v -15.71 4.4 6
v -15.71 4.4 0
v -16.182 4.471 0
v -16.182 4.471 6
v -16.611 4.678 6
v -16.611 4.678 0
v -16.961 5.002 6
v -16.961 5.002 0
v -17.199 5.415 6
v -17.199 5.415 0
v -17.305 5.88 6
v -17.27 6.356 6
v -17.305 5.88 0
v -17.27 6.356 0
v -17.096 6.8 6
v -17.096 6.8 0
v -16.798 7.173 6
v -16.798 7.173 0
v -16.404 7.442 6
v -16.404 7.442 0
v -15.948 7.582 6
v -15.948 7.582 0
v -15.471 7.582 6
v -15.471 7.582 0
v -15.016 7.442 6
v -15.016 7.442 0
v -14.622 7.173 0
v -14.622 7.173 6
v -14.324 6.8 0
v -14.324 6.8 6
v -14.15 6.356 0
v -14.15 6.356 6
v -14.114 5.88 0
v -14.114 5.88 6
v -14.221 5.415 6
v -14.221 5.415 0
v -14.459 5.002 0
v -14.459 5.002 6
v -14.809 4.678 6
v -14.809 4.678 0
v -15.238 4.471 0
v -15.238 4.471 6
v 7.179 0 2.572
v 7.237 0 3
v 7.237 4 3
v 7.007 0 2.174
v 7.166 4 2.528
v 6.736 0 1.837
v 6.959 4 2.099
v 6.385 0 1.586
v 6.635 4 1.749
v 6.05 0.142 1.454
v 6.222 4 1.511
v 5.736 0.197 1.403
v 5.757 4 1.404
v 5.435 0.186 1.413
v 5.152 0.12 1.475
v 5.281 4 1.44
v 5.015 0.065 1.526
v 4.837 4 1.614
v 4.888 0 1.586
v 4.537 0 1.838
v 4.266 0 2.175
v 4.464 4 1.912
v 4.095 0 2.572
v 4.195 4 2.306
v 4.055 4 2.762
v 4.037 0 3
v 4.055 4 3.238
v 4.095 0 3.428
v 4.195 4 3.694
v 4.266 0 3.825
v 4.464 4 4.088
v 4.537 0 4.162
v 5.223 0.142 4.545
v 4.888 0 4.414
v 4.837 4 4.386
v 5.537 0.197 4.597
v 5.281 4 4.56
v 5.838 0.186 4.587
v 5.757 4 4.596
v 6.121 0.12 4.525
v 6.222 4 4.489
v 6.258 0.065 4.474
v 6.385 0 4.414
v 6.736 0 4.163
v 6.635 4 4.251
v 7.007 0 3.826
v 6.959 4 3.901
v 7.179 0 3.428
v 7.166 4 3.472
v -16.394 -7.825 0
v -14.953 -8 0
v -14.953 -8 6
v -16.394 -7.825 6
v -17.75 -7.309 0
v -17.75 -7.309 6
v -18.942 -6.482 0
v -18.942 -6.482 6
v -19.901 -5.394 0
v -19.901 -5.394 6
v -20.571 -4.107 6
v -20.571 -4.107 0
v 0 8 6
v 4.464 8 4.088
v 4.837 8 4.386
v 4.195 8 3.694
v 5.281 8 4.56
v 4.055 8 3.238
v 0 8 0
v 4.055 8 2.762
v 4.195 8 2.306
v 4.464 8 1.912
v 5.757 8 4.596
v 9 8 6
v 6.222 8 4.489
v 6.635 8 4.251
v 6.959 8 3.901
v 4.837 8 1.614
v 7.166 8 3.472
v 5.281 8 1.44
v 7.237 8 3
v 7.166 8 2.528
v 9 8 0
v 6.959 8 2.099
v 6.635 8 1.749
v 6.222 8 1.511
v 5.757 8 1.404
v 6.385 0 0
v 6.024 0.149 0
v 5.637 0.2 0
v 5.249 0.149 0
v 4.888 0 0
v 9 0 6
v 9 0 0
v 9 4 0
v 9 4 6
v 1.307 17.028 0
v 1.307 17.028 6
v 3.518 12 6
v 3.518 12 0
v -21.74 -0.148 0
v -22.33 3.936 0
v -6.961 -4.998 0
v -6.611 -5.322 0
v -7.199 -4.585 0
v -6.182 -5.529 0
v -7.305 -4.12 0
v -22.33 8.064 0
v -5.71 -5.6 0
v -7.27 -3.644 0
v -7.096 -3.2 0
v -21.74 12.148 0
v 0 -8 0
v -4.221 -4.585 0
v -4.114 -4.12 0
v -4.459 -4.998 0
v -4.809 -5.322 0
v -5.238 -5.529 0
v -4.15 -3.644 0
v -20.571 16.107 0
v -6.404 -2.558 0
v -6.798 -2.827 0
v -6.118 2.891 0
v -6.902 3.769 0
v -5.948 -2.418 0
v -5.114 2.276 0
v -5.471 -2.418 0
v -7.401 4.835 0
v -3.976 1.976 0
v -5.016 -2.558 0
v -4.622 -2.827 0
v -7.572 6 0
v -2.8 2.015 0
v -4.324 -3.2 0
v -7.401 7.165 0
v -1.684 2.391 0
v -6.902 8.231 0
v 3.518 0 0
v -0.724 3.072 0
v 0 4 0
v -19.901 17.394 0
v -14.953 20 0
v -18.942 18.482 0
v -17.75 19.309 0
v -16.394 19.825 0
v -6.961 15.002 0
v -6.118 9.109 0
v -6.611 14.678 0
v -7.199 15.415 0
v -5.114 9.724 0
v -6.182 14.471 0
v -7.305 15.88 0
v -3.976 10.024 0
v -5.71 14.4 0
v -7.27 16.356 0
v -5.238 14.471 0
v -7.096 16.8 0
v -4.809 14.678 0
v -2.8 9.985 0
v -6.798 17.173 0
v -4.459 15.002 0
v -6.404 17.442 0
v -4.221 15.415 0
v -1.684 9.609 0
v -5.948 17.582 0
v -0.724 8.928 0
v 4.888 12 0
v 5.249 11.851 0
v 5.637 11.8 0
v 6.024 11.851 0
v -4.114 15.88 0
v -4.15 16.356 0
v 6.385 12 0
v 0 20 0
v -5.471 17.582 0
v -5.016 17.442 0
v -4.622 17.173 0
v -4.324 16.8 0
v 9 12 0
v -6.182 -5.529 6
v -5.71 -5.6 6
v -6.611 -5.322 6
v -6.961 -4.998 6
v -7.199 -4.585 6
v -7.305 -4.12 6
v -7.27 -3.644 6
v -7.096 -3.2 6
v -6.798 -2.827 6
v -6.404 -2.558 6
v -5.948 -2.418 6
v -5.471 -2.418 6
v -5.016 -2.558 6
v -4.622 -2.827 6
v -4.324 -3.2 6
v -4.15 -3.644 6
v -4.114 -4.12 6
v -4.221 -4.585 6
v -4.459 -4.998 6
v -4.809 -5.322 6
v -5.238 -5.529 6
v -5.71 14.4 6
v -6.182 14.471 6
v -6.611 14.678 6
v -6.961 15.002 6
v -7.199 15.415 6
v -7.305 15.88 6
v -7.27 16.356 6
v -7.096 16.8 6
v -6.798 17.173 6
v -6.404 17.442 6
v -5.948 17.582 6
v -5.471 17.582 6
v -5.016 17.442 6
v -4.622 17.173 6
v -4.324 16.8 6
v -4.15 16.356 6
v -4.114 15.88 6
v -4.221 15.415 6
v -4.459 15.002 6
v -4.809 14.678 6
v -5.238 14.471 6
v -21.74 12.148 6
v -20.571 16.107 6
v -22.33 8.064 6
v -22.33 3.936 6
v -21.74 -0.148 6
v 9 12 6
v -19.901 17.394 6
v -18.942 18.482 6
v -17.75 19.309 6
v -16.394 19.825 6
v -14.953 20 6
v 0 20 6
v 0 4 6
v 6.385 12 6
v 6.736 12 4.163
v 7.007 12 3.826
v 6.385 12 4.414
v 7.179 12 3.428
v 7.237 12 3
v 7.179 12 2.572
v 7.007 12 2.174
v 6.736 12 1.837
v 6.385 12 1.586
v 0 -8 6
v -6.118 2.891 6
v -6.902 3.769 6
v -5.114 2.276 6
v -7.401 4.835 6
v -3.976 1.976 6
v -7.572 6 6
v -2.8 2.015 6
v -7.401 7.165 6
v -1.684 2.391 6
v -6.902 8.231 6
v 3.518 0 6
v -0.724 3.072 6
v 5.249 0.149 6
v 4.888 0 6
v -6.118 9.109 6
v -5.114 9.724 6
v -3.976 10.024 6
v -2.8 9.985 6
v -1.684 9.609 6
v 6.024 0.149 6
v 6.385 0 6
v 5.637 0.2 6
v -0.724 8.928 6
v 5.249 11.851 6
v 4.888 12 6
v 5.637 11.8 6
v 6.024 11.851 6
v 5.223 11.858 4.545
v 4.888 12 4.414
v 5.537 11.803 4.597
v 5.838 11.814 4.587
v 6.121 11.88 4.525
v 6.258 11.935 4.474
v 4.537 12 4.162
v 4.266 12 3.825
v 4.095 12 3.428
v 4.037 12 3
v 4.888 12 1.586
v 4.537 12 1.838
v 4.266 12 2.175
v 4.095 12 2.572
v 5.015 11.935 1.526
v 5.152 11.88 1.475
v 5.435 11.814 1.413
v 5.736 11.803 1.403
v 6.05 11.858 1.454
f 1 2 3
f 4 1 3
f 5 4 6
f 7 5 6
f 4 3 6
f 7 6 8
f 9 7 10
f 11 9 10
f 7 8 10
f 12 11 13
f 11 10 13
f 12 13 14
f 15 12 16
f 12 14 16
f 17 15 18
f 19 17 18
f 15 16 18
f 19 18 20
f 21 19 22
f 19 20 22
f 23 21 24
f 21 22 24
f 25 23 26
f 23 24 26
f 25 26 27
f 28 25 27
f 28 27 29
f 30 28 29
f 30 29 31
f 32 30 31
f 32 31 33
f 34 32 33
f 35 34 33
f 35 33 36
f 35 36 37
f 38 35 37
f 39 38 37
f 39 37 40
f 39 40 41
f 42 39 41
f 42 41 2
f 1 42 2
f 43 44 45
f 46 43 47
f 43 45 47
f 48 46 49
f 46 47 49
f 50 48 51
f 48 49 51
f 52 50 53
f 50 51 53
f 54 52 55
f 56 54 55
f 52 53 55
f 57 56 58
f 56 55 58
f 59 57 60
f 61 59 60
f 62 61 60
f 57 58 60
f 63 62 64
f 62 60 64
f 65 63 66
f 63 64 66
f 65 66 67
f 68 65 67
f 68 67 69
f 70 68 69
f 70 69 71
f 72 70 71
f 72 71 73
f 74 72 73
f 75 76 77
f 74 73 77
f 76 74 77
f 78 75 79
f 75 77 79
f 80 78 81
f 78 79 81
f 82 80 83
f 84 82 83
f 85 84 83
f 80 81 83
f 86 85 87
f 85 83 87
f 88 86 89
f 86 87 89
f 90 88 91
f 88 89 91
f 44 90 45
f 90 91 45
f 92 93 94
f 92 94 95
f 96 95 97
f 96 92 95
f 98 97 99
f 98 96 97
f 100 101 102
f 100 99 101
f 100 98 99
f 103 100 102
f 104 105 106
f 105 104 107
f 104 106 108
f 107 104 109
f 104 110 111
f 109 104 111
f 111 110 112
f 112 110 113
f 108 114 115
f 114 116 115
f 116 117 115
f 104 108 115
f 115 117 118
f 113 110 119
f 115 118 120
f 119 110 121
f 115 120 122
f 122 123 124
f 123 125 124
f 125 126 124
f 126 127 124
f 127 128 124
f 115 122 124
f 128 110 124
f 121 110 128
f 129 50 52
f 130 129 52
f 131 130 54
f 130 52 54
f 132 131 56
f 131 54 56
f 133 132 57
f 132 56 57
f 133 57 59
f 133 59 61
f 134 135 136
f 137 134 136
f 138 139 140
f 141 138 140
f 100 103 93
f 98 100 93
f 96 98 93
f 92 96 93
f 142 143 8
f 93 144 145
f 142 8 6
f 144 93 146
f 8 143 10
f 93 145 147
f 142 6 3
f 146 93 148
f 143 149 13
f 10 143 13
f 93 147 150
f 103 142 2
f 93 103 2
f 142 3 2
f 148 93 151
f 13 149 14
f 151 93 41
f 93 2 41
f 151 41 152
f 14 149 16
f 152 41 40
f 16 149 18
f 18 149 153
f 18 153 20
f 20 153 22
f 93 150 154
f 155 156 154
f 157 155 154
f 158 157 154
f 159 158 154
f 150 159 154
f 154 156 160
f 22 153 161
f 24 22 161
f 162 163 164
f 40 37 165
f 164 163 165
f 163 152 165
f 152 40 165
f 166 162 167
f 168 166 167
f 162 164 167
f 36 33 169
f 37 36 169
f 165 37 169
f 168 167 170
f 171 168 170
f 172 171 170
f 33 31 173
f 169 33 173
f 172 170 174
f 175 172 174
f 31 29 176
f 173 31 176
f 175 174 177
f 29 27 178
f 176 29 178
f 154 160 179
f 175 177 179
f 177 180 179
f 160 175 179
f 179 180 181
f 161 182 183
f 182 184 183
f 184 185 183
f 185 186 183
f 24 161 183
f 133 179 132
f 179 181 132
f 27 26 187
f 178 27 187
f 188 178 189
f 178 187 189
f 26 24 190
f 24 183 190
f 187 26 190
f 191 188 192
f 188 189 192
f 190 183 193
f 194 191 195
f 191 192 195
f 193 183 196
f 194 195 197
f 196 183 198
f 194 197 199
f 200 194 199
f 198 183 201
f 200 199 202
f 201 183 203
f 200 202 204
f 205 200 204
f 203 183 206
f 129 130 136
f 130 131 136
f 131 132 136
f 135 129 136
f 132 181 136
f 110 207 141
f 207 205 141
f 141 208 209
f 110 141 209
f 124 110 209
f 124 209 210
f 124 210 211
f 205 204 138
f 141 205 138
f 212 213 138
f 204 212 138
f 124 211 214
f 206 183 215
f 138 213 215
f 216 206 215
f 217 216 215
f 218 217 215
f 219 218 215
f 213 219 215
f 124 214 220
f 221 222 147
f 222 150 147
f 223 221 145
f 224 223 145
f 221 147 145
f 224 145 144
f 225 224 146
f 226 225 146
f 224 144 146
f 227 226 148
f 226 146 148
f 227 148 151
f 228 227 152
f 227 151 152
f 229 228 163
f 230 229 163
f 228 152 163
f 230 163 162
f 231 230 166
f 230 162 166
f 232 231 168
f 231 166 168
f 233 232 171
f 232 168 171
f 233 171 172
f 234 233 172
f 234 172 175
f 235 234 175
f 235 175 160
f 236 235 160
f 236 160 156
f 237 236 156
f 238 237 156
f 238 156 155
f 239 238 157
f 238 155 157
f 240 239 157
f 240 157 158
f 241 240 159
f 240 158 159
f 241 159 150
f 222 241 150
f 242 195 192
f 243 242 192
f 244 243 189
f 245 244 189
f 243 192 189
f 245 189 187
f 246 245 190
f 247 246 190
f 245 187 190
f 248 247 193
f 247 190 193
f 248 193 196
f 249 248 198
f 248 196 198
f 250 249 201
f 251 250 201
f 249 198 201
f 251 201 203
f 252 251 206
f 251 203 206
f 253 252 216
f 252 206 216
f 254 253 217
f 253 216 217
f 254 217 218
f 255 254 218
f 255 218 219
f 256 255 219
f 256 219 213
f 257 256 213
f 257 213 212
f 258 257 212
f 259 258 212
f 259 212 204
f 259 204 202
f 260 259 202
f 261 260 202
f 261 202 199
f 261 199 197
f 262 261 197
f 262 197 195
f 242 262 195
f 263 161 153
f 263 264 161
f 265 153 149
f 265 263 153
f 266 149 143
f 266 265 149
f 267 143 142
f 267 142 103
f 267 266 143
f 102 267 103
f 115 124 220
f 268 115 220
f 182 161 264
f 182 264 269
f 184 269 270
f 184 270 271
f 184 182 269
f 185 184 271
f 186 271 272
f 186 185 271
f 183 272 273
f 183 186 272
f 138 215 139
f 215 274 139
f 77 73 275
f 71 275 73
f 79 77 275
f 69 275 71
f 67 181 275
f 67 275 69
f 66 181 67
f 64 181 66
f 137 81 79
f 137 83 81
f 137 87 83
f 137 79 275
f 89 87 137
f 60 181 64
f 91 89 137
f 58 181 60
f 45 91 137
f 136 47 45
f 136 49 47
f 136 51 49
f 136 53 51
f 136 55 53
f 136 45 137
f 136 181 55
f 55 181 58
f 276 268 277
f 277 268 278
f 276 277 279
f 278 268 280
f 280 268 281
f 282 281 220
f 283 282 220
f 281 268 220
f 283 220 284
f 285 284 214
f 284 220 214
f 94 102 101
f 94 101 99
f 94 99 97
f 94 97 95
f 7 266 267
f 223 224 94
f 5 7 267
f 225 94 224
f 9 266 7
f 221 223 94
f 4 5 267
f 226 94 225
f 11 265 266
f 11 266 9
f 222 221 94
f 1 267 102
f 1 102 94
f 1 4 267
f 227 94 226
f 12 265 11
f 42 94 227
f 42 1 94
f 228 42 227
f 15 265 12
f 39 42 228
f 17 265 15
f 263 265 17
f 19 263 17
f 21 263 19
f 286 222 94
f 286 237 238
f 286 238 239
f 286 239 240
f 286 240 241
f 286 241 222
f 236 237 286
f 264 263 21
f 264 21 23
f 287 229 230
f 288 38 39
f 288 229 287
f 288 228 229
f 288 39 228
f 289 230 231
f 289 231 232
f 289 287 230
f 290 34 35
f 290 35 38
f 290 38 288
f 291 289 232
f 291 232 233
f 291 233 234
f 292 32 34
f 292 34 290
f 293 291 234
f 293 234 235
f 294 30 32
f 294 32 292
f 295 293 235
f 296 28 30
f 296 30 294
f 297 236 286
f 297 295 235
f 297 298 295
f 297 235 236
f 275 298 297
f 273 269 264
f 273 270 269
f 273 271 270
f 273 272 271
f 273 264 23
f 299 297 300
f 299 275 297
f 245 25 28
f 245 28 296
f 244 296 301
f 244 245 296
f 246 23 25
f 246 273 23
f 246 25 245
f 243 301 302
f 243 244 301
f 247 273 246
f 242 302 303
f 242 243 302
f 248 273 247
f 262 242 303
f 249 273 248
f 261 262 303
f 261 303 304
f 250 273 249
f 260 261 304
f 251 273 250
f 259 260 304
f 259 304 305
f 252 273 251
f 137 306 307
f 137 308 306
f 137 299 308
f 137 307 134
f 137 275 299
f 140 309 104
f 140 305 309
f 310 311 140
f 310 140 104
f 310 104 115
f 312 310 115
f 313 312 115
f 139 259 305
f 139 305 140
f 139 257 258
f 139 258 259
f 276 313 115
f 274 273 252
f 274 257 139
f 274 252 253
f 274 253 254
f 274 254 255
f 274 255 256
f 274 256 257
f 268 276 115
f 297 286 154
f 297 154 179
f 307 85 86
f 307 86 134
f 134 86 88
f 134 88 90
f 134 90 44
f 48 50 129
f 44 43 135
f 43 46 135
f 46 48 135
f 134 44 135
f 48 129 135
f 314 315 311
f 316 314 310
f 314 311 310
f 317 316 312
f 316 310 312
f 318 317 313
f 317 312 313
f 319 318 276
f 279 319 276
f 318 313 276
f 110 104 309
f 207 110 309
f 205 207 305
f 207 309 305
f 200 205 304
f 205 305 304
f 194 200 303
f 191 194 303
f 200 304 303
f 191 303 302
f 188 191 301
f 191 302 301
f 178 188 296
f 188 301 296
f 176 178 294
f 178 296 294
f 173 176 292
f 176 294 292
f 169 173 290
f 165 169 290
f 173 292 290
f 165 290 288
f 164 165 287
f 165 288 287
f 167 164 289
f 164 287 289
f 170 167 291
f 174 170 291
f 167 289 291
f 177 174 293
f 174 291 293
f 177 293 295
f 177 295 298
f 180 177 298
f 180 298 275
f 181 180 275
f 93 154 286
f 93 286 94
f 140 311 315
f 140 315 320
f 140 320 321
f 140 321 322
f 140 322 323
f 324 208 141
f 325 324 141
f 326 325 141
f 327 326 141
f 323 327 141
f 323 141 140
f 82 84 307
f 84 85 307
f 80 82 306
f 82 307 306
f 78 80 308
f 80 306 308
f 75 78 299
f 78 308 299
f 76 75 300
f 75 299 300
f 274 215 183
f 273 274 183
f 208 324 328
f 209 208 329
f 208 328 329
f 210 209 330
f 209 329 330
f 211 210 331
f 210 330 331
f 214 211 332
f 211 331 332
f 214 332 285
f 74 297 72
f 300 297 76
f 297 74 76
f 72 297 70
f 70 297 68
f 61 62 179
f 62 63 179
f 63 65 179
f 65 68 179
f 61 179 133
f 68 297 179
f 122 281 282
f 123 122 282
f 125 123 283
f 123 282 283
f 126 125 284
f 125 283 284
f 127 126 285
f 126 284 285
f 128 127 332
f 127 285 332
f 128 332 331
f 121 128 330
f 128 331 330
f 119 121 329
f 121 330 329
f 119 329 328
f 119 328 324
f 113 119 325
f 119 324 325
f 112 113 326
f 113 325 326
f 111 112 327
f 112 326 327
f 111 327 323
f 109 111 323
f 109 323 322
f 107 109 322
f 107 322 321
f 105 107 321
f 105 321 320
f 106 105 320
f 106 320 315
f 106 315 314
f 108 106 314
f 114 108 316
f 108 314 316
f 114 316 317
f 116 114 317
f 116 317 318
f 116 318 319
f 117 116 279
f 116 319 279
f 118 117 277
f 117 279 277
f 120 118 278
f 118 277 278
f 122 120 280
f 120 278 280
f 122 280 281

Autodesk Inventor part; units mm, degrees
ref_plane "YZ Plane" through (0, 0, 0) normal (1, 0, 0) x (0, 1, 0)
ref_plane "XZ Plane" through (0, 0, 0) normal (0, 1, 0) x (-1, 0, 0)
ref_plane "XY Plane" through (0, 0, 0) normal (0, 0, 1) x (1, 0, 0)
sketch "スケッチ1" plane through (0, 0, 0) normal (0, 0, 1) x (1, 0, 0)
  line L0 (9, 0) -> (9, 4)
  line L1 (9, 12) -> (2.2731, 12)
  line L2 (0, 8) -> (9, 8)
  line L3 (0, 4) -> (9, 4)
  line L4 (9, 8) -> (9, 12)
  arc A0 (0, 8) -> (0, 4) centre (-5.7099, 6) ccw
  line L5 (2.2731, 12) -> (0, 14.2779)
  line L6 (2.2731, 0) -> (-5.7099, -8)
  line L7 (-5.7099, 20) -> (-15.7099, 20)
  line L8 (-5.7099, -8) -> (-15.7099, -8)
  line L9 (-15.7099, 20) -> (-25.7698, 20)
  line L10 (-25.7698, 20) -> (-25.7698, -8)
  line L11 (-25.7698, -8) -> (-15.7099, -8)
  line L12 (2.2731, 0) -> (9, 0)
  line L13 (0, 14.2779) -> (-5.7099, 20)
  point P0 (0, 0)
  point P1 (4.5, 12)
  point P2 (4.5, 0)
  point P3 (4.5, 4)
  point P4 (-25.7099, 6)
  dimension "d4" = 12.1
  dimension "d5" = 4
  dimension "d6" = 14
  dimension "d7" = 14
  dimension "d8" = 10
  dimension "d9" = 10
  dimension "d10" = 20
  dimension "d12" = 14
extrude "押し出し1" add sketch "スケッチ1" along normal blind 6
sketch "スケッチ2" plane through (0, 0, 6) normal (0, 0, 1) x (1, 0, 0)
  circle A0 centre (5.6365, 13.3) radius 1.5
  line L0 (9, 8) -> (9, 12) projected
  line L1 (11.5477, 6) -> (-28.1936, 6) construction
  line L2 (9, 12) -> (2.2731, 12) projected
  circle A1 centre (5.6365, -1.3) radius 1.5
  point P0 (0, 0)
  point P1 (4.8882, 12)
  point P2 (6.3849, 12)
  dimension "d15" = 3
  dimension "d16" = 3.3635
  dimension "d17" = 1.3
extrude "押し出し2" cut sketch "スケッチ2" against normal blind 6 contours A0 L2 | A1 picked at (5.4614, 13.0013)
sketch "スケッチ3" plane through (0, 0, 6) normal (0, 0, 1) x (1, 0, 0)
  circle A0 centre (5.6365, 13.3) radius 1.5
  line L0 (9, 12) -> (2.2731, 12) projected
  point P0 (0, 0)
  point P1 (4.8882, 12)
  point P2 (6.3849, 12)
  dimension "d20" = 3
  dimension "d21" = 1.3
extrude "押し出し3" add sketch "スケッチ3" against normal blind 6 contours A0 L0 picked at (5.4614, 13.0013)
sketch "スケッチ4" plane through (0, 0, 6) normal (0, 0, 1) x (1, 0, 0)
  arc A0 (6.3849, 12) -> (4.8882, 12) centre (5.6365, 13.3) ccw projected
  circle A1 centre (5.6365, 13.3) radius 1.5
  point P0 (0, 0)
  dimension "d24" = 3
extrude "押し出し4" cut sketch "スケッチ4" against normal blind 6
fillet "フィレット1" radius 5 1 edges at (-25.7698, 20, 3)
fillet "フィレット2" radius 5 1 edges at (-25.7698, -8, 3)
fillet "フィレット3" radius 3 4 edges at (-5.7099, -8, 3) (2.2731, 0, 3) (-5.7099, 20, 3) (2.2731, 12, 3)
sketch "スケッチ6" plane through (0, 4, 0) normal (0, 1, 0) x (1, 0, 0)
  point P0 (0, 0)
sketch "スケッチ7" plane through (4.8882, 12, 6) normal (0, 1, 0) x (1, 0, 0)
  circle A0 centre (0.7488, 3) radius 1.6
  line L0 (1.4967, 0) -> (0, 0) projected
  line L1 (4.1118, 6) -> (4.1118, 0) projected
  point P0 (-4.8882, 6)
  point P1 (0.7483, 0)
  dimension "d43" = 3.2
  dimension "d44" = 3
  dimension "d45" = 3.363
extrude "押し出し5" cut sketch "スケッチ7" against normal blind 28
sketch "スケッチ11" plane through (0, 0, 6) normal (0, 0, 1) x (1, 0, 0)
  line L0 (-6.9544, 20) -> (-20.7698, 20) projected
  line L1 (-20.7698, 20) -> (-6.9544, 20)
  arc A0 (1.394, 12.8809) -> (3.5176, 12) centre (3.5176, 15) ccw projected
  line L2 (0, 20) -> (1.3068, 17.0279)
  arc A1 (1.394, 12.8809) -> (3.5176, 12) centre (3.5176, 15) ccw
  arc A2 (-4.8308, 19.1191) -> (-6.9544, 20) centre (-6.9544, 17) ccw projected
  arc A3 (-4.8308, 19.1191) -> (-6.9544, 20) centre (-6.9544, 17) ccw
  line L3 (1.394, 12.8809) -> (-4.8308, 19.1191) projected
  line L4 (-4.8308, 19.1191) -> (1.394, 12.8809)
  arc A4 (0, 8) -> (0, 4) centre (-5.7099, 6) ccw projected
  line L5 (-11.7599, 6) -> (12.1155, 6) construction
  line L6 (-20.7698, -8) -> (0, -8)
  line L7 (0, -8) -> (3.5176, 0)
  arc A5 (-6.9544, -8) -> (-4.8308, -7.1191) centre (-6.9544, -5) ccw
  line L8 (1.394, -0.8809) -> (-4.8308, -7.1191)
  line L9 (-6.9544, 20) -> (0, 20)
  line L10 (1.3068, 17.0279) -> (3.5176, 12)
  arc A6 (3.5176, 0) -> (1.394, -0.8809) centre (3.5176, -3) ccw
  point P0 (0, 0)
extrude "押し出し6" add sketch "スケッチ11" against normal blind 6
sketch "スケッチ12" plane through (0, 0, 6) normal (0, 0, 1) x (1, 0, 0)
  arc A0 (0, 8) -> (0, 4) centre (-5.7099, 6) ccw projected
  point P0 (0, 0)
  point P1 (-15.7099, 6)
  point P2 (-5.7099, 16)
  point P3 (-5.7099, -4)
  dimension "d74" = 10
  dimension "d76" = 10
  dimension "d77" = 10
hole "穴4" at (-15.7099, 6, 6) at (-5.7099, 16, 6) at (-5.7099, -4, 6) direction (0, 0, -1) diameter 3.2 end through all
sketch "スケッチ13" plane through (0, 0, 6) normal (0, 0, 1) x (1, 0, 0)
  line L0 (-20.7698, -8) -> (0, -8) projected
  line L1 (0, 20) -> (-20.7698, 20) projected
  line L2 (-18.7698, 20) -> (-18.7698, -8) construction
  line L3 (-25.7698, 15) -> (-25.7698, -3) projected
  arc A0 (-18.7698, 20) -> (-18.7698, -8) centre (6.3784, 6) ccw
  line L4 (-18.7698, 20) -> (-29.3351, 20)
  line L5 (-29.3351, 20) -> (-29.3351, -8)
  line L6 (-29.3351, -8) -> (-18.7698, -8)
  point P0 (0, 0)
  dimension "d85" = 7
extrude "押し出し7" cut sketch "スケッチ13" against normal blind 6
fillet "フィレット4" radius 6 1 edges at (-18.7698, 20, 3)
fillet "フィレット5" radius 6 1 edges at (-18.7698, -8, 3)
sketch "スケッチ14" plane through (0, 0, 6) normal (0, 0, 1) x (1, 0, 0)
  arc A0 (0, 8) -> (0, 4) centre (-3.5217, 6) ccw
  arc A1 (0, 8) -> (0, 4) centre (-5.7099, 6) ccw projected
  point P0 (0, 0)
  point P1 (0, 4)
  dimension "d90" = 8.1
extrude "押し出し8" add sketch "スケッチ14" against normal blind 6
properties part number "射出_腕固定2" material "ポリカーボネート、クリア"
